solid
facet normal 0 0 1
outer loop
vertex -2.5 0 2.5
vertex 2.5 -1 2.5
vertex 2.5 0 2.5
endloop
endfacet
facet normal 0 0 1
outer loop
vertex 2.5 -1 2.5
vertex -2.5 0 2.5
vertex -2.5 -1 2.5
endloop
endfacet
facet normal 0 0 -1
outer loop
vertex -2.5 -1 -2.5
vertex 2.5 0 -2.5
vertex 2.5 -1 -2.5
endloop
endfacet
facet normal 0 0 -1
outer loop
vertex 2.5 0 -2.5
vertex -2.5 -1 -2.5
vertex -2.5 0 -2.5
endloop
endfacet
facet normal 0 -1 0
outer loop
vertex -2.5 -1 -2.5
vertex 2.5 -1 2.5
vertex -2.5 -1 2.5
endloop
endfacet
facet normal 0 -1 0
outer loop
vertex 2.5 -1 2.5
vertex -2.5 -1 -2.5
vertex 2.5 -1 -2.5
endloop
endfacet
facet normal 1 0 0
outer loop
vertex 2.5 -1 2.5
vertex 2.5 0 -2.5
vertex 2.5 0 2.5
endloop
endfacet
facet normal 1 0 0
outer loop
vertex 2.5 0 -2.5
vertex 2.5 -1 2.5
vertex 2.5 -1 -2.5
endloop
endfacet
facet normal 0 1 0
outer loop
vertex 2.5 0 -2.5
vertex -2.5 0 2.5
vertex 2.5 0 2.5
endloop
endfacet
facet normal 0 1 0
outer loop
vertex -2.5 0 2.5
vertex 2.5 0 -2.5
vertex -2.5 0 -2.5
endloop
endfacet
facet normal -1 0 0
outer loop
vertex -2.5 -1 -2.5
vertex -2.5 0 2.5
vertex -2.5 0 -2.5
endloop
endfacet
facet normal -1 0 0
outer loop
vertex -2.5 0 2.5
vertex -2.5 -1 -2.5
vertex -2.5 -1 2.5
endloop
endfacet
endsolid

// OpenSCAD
// Baseline CAD geometry, with all dimensions in millimetres; +Y follows the throat and +Z is up.
// Positive modules describe air/cutting volumes; skin modules describe outer material.
// solidBody subtracts the former from the latter. The thin spawn cube spans Y=-1 to 0,
// so the generator can retain its Y=0 face and construct the inlet boundary rectangle.
// The final two calls display BOTH objects. Export each module separately as ASCII STL
// using the wrapper procedure in README; exporting this complete scene combines them.

skinThickness = 5;

throatWidth = 5;
throatLength = 50;
throatHeight = 5;

voicingHoleWidth = 5;
voicingHoleLength = 5;
voicingHoleHeight = skinThickness;
voicingHoleX = -voicingHoleWidth / 2;
voicingHoleY = throatLength;
voicingHoleZ = throatHeight / 2;

voicingEdgeLength = 10;

pressureChamberWidth = 50;
pressureChamberLength = 50;
pressureChamberHeight = 50;
pressureChamberX = -pressureChamberWidth / 2;
pressureChamberY = throatLength;
pressureChamberZ = -pressureChamberHeight + throatHeight / 2;


module throatPositive() {
    translate([-throatWidth / 2, -1, -throatHeight / 2])
    cube([throatWidth, throatLength + 2, throatHeight]);
}

module throatSkin() {
    translate([-(pressureChamberWidth + skinThickness * 2) / 2, 0, pressureChamberZ - skinThickness])
    cube([pressureChamberWidth + skinThickness * 2, throatLength - 1, pressureChamberHeight + skinThickness * 2]);
}

module voicingHolePositive() {
    translate([voicingHoleX, voicingHoleY, voicingHoleZ - 1])
    cube([voicingHoleWidth, voicingHoleLength, voicingHoleHeight + 2]);
}

module voicingEdgePositive() {
    translate([voicingHoleWidth / 2, voicingHoleY + voicingHoleLength - 0.00001, throatHeight / 2])
    rotate([0, -90, 0])
    linear_extrude(height = voicingHoleWidth)
    polygon([
        [0, 0],
        [skinThickness + 0.00001, 0],
        [skinThickness + 0.00001, voicingEdgeLength + 1]
    ]);
}

module pressureChamberPositive() {
    translate([pressureChamberX, pressureChamberY, pressureChamberZ])
    cube([pressureChamberWidth, pressureChamberLength, pressureChamberHeight]);
}

module pressureChamberSkin() {
    translate([pressureChamberX - skinThickness, pressureChamberY - skinThickness, pressureChamberZ - skinThickness])
    cube([pressureChamberWidth + skinThickness * 2, pressureChamberLength + skinThickness * 2, pressureChamberHeight + skinThickness * 2]);
}

module positiveGroup() {
    union() {
        throatPositive();
        voicingHolePositive();
        voicingEdgePositive();
        pressureChamberPositive();
    }
}

module skinGroup() {
    union() {
        throatSkin();
        pressureChamberSkin();
    }
}

module solidBody() {
    difference() {
        skinGroup();
        positiveGroup();
    }
}

module spawnPlane() {
    translate([-throatWidth / 2, -1, -throatHeight / 2])
    cube([throatWidth, 1, throatHeight]);
}


*solidBody();
spawnPlane();
